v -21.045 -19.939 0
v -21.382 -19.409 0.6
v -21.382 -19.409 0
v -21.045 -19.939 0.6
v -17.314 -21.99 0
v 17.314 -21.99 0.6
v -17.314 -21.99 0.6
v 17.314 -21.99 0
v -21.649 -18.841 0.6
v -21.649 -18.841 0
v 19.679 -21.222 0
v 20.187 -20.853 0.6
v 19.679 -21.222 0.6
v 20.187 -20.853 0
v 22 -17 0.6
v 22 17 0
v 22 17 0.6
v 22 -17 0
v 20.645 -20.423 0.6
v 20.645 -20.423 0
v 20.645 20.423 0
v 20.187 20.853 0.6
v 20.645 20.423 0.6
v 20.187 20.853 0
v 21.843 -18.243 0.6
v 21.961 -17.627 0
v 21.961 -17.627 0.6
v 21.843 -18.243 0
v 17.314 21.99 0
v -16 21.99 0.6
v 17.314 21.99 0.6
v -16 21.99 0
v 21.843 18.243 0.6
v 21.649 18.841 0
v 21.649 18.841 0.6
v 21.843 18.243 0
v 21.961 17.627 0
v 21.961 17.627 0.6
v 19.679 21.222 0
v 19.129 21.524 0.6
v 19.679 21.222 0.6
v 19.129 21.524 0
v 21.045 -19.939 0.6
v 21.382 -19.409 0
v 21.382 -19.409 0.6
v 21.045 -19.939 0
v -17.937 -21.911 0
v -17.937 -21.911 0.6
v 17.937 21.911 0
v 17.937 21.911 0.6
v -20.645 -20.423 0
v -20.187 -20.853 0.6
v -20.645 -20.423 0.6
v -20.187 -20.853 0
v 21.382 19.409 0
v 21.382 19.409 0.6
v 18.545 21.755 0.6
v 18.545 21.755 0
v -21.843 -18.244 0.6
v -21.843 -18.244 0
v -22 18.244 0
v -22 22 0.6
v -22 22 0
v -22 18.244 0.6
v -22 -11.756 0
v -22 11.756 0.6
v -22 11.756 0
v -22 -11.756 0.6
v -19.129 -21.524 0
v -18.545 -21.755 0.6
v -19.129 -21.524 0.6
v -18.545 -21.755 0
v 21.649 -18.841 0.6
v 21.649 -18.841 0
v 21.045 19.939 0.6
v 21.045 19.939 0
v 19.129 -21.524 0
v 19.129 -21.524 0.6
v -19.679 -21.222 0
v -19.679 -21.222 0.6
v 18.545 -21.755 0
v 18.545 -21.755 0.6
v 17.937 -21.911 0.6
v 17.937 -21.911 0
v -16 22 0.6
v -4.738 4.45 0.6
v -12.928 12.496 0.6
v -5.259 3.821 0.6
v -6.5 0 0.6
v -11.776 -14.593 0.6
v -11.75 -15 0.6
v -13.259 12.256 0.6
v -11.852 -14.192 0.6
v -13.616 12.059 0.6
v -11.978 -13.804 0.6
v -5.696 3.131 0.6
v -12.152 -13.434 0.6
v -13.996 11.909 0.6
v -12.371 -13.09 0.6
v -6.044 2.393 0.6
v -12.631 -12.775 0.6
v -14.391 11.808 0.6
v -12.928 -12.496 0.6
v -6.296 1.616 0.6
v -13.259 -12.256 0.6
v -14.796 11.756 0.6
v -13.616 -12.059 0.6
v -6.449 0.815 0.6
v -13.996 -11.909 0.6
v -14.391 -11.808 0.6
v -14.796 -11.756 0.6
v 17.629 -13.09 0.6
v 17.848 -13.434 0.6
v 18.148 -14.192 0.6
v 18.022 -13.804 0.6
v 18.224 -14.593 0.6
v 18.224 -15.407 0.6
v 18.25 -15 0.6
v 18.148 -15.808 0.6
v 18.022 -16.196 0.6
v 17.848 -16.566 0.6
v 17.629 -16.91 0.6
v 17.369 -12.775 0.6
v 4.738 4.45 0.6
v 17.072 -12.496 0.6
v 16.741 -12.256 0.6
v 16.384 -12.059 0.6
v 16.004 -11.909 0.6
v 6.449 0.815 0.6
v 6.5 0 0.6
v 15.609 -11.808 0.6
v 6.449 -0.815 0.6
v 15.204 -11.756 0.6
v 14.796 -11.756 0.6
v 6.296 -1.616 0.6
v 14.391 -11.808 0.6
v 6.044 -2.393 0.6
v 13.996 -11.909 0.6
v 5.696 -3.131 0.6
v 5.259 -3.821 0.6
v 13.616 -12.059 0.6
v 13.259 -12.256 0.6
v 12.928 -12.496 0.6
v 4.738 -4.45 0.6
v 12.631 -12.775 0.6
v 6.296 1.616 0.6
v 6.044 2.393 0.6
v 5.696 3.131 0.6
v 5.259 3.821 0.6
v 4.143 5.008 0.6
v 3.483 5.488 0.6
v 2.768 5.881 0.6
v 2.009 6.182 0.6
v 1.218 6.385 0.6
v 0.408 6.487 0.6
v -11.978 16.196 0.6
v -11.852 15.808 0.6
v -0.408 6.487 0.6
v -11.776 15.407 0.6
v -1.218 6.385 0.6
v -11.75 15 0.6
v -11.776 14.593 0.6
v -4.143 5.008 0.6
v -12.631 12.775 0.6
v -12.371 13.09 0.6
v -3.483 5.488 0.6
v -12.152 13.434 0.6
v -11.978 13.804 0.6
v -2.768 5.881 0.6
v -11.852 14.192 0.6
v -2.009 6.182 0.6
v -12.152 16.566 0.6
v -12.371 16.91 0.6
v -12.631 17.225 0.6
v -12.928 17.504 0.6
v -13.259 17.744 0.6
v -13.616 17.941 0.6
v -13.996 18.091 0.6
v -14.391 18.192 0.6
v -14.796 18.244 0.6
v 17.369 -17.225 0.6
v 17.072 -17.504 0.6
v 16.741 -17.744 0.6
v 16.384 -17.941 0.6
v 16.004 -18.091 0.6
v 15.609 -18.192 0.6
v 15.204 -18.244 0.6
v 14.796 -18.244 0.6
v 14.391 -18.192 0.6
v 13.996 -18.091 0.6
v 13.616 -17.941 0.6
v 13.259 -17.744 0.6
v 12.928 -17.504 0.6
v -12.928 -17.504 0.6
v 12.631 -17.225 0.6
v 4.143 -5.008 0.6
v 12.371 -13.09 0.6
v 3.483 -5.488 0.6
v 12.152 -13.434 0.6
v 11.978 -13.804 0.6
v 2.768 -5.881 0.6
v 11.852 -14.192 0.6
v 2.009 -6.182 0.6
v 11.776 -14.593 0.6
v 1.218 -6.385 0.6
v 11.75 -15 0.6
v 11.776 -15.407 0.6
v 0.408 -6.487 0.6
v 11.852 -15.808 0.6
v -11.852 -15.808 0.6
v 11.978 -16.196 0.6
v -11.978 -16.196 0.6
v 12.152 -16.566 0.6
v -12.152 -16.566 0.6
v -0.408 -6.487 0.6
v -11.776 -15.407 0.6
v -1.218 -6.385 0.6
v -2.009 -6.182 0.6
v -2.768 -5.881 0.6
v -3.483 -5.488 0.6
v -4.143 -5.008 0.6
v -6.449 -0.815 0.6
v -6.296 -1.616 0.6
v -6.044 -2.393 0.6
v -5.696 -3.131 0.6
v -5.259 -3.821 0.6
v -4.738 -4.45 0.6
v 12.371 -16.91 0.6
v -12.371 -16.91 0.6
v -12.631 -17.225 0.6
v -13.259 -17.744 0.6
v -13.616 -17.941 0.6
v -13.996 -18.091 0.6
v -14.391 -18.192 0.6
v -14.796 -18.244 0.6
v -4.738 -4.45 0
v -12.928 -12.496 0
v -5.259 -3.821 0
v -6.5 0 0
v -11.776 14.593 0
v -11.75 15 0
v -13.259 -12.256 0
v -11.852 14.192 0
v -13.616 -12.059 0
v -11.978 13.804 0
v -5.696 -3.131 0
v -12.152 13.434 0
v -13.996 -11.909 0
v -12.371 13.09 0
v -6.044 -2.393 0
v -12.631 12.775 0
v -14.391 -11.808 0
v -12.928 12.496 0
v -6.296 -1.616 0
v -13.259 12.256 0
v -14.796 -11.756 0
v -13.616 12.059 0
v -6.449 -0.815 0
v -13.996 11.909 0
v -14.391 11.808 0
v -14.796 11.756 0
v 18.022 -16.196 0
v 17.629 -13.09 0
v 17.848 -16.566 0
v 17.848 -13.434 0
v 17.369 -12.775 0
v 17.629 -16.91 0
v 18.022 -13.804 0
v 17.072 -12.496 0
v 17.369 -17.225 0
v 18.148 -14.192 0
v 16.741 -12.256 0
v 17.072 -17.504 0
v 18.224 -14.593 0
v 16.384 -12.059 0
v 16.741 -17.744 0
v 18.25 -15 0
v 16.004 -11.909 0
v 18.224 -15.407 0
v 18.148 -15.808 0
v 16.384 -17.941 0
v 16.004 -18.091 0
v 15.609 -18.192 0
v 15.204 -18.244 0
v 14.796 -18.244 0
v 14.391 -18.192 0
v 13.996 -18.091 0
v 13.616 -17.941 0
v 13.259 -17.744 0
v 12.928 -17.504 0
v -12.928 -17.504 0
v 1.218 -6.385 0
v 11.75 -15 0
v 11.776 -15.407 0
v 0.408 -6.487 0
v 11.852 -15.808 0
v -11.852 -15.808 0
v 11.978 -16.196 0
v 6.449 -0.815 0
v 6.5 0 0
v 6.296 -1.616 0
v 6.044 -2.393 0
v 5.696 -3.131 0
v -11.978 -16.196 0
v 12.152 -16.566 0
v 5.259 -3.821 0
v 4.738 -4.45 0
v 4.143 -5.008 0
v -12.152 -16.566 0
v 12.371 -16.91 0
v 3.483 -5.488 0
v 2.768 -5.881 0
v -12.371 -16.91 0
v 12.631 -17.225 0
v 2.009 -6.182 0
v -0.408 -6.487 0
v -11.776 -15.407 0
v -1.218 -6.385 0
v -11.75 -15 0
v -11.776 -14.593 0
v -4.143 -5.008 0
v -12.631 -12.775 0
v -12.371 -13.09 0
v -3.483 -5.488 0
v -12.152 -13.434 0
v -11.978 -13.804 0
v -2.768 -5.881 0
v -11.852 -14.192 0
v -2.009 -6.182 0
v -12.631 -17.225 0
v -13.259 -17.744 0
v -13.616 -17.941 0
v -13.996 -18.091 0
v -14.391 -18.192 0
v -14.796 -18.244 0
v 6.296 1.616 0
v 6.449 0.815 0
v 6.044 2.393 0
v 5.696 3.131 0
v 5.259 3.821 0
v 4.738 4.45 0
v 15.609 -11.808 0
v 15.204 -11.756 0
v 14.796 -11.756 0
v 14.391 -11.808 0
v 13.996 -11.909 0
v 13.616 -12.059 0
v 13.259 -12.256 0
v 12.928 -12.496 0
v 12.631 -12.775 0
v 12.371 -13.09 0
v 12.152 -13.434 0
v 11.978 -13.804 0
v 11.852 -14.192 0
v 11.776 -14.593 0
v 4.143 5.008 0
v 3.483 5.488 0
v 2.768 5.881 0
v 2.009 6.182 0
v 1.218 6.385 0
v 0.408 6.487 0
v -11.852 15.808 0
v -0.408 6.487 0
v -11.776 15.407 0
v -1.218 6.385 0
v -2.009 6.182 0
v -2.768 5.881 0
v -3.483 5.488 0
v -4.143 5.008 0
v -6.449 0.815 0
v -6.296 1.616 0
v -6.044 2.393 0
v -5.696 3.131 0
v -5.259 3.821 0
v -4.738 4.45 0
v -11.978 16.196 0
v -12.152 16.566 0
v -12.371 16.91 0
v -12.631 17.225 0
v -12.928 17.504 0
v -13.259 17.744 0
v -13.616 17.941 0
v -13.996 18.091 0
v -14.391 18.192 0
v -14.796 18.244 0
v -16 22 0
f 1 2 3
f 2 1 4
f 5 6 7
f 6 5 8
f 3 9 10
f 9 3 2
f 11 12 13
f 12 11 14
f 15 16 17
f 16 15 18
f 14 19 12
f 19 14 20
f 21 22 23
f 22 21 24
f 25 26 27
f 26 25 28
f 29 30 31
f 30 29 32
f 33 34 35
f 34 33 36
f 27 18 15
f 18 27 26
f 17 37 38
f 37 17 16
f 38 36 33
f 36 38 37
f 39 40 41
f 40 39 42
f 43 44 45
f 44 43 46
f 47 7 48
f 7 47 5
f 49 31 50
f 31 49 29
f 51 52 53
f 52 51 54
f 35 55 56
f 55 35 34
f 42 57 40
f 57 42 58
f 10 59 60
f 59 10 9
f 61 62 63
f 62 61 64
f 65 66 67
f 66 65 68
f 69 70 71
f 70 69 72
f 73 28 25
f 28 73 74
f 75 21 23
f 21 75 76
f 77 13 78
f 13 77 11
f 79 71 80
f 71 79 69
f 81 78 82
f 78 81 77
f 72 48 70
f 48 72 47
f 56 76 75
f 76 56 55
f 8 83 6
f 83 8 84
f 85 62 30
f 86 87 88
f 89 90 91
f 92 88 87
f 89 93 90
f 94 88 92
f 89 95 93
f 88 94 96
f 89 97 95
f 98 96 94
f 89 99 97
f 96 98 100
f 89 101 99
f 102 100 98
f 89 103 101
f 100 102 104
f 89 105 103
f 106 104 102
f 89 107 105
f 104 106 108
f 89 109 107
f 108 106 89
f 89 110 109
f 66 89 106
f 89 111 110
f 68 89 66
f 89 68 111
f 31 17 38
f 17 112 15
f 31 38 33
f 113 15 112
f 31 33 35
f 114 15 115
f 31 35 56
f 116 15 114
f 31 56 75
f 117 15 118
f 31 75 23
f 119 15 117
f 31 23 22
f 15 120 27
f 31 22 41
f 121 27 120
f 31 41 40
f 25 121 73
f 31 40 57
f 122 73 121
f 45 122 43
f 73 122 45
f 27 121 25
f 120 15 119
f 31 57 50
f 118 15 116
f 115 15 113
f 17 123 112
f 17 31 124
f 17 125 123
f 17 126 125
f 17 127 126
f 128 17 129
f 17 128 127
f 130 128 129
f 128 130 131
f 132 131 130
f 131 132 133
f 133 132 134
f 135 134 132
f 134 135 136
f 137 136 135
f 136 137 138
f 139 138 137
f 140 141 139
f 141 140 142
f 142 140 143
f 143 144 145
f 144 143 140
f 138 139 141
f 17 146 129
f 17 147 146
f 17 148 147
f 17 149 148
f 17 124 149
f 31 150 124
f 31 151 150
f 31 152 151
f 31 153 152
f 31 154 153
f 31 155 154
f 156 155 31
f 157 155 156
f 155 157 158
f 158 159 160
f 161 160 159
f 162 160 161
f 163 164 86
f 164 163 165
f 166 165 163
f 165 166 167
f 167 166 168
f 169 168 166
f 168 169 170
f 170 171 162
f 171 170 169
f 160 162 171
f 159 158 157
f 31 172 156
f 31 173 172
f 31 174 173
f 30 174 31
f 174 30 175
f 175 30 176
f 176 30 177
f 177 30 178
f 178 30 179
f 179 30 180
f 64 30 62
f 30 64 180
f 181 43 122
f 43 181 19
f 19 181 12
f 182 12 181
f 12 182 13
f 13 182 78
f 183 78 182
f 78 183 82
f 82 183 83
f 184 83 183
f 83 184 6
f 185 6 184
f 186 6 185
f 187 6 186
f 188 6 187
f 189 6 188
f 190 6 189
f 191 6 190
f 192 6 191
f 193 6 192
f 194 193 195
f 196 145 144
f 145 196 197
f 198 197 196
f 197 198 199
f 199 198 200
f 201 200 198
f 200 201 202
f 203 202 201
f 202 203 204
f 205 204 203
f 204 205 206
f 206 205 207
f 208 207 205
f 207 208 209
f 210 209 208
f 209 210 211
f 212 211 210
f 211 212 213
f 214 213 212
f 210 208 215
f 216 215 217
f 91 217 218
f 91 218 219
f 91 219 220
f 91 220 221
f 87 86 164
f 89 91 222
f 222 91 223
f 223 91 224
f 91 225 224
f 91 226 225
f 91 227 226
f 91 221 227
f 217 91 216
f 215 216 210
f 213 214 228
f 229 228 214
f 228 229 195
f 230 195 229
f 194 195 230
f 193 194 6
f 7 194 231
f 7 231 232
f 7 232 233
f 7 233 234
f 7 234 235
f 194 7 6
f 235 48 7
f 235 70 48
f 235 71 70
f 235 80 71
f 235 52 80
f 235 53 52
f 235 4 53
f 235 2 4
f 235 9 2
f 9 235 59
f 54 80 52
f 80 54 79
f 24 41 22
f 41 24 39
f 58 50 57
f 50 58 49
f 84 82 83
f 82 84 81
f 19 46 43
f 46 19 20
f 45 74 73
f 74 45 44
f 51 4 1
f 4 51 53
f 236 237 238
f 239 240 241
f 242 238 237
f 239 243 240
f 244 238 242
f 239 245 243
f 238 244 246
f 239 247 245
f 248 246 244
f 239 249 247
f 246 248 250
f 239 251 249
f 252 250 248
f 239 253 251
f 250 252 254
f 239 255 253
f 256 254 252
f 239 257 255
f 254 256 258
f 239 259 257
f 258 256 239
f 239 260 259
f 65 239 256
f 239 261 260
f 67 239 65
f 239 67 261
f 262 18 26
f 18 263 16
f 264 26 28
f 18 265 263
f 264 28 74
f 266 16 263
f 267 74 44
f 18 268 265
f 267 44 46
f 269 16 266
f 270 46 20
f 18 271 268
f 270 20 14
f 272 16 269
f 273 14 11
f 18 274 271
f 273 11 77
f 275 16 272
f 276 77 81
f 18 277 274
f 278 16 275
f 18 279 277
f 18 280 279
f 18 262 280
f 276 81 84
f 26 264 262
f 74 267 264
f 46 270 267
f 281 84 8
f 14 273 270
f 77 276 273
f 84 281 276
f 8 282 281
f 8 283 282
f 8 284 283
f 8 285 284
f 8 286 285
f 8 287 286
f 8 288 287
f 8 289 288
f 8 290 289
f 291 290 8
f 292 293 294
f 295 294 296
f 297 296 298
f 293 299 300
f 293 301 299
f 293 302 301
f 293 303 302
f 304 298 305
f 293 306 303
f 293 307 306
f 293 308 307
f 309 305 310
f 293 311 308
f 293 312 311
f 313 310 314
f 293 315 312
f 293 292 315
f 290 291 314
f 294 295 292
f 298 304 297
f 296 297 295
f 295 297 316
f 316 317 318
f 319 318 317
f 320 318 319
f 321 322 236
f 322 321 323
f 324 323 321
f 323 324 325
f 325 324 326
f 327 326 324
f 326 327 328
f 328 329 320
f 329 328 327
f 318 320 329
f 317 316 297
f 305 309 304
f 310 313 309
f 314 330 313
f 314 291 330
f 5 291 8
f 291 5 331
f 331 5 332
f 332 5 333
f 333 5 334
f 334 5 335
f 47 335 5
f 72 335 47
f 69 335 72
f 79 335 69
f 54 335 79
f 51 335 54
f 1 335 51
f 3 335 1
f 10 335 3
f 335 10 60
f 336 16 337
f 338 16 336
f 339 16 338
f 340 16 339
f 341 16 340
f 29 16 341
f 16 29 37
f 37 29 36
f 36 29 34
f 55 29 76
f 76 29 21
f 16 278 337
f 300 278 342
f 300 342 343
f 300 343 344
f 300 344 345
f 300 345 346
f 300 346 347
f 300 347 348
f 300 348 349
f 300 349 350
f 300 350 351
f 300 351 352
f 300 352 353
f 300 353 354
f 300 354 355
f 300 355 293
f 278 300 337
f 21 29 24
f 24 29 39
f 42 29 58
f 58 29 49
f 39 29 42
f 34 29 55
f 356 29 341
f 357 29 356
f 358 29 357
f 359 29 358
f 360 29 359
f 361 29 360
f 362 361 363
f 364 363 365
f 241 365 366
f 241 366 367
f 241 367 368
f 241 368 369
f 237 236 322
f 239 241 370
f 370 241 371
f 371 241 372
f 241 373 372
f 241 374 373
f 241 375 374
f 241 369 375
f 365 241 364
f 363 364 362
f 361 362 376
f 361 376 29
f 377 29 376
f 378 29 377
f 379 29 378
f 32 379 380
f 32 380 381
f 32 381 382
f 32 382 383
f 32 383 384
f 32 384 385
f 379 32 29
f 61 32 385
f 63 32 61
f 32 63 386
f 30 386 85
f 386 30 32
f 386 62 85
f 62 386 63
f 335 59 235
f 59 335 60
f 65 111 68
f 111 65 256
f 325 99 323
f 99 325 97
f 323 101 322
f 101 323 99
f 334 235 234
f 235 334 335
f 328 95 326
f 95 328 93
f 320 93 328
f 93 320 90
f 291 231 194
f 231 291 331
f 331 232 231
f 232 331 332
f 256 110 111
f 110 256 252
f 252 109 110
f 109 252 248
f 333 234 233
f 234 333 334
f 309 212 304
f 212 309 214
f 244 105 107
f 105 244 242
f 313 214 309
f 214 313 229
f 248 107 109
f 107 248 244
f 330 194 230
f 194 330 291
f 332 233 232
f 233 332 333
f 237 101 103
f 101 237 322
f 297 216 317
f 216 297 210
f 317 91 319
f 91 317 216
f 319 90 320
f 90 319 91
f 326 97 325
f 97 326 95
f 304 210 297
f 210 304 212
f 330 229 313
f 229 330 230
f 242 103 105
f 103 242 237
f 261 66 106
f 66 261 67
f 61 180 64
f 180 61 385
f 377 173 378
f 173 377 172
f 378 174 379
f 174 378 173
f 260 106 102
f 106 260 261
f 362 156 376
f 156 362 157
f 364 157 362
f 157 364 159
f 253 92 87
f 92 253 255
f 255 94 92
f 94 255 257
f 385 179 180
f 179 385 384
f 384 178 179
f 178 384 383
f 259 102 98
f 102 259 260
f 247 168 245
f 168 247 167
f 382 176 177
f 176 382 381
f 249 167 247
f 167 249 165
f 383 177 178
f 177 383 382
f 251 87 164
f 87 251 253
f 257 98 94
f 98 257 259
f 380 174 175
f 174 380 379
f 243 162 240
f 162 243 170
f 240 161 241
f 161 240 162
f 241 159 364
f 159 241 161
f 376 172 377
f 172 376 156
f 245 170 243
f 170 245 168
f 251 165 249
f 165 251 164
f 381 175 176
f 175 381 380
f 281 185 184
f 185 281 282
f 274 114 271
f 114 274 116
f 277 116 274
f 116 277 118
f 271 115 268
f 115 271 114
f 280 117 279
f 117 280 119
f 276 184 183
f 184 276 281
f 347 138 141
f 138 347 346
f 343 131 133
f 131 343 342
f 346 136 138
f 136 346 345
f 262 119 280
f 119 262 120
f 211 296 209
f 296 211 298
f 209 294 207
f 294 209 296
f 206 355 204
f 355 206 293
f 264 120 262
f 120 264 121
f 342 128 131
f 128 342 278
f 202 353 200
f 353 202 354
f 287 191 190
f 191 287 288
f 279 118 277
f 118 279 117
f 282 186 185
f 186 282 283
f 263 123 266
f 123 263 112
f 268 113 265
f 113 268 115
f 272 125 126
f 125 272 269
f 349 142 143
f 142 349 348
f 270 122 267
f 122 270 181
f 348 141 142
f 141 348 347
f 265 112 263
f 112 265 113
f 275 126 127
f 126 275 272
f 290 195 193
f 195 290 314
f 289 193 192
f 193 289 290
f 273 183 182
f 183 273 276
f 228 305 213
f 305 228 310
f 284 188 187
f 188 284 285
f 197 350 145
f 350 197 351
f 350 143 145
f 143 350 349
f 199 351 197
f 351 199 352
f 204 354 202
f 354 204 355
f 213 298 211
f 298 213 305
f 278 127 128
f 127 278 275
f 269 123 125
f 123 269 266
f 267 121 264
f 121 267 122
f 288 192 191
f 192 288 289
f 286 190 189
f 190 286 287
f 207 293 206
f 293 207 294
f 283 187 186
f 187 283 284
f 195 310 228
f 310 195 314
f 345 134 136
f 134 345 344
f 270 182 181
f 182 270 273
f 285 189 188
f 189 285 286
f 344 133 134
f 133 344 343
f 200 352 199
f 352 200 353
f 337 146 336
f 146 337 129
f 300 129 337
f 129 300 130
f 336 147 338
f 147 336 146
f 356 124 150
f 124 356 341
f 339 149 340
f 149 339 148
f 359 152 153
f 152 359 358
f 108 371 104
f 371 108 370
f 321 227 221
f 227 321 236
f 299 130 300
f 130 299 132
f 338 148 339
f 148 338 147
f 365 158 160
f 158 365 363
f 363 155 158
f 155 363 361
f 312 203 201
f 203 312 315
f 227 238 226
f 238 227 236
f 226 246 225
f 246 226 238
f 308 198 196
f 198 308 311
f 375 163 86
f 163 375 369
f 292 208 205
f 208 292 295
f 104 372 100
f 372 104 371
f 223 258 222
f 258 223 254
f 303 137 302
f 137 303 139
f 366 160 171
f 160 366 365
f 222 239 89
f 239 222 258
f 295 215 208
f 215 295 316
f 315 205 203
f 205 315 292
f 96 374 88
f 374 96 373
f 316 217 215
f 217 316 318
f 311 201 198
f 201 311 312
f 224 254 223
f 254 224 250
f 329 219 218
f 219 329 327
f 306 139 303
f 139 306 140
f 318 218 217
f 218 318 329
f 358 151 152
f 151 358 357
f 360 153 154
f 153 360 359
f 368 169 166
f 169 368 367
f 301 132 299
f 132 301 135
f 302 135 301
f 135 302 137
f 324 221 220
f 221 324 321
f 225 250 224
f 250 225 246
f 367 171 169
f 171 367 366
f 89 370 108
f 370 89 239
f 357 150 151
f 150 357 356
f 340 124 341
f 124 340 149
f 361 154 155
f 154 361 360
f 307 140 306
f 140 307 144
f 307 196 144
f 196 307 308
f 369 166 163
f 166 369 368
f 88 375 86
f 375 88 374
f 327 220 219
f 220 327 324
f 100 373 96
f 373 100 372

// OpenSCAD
$fn = 50;


difference() {
	union() {
		translate(v = [0, 0, 0]) {
			rotate(a = [0, 0, 0]) {
				hull() {
					translate(v = [-17.0000000000, 17.0000000000, 0]) {
						rotate(a = [0, 0, 0]) {
							translate(v = [0, 0, 0]) {
								rotate(a = [0, 0, 0]) {
									cylinder(h = 0.6000000000, r = 5);
								}
							}
						}
					}
					translate(v = [17.0000000000, 17.0000000000, 0]) {
						rotate(a = [0, 0, 0]) {
							translate(v = [0, 0, 0]) {
								rotate(a = [0, 0, 0]) {
									cylinder(h = 0.6000000000, r = 5);
								}
							}
						}
					}
					translate(v = [-17.0000000000, -17.0000000000, 0]) {
						rotate(a = [0, 0, 0]) {
							translate(v = [0, 0, 0]) {
								rotate(a = [0, 0, 0]) {
									cylinder(h = 0.6000000000, r = 5);
								}
							}
						}
					}
					translate(v = [17.0000000000, -17.0000000000, 0]) {
						rotate(a = [0, 0, 0]) {
							translate(v = [0, 0, 0]) {
								rotate(a = [0, 0, 0]) {
									cylinder(h = 0.6000000000, r = 5);
								}
							}
						}
					}
				}
			}
		}
		translate(v = [-22.0000000000, 16.0000000000, 0]) {
			rotate(a = [0, 0, 0]) {
				cube(size = [6, 6, 0.6000000000]);
			}
		}
	}
	union() {
		translate(v = [-22.5000000000, -15.0000000000, -125]) {
			rotate(a = [0, 0, 0]) {
				hull() {
					translate(v = [7.5000000000, 0, 0]) {
						rotate(a = [0, 0, 0]) {
							translate(v = [0, 0, 0]) {
								rotate(a = [0, 0, 0]) {
									cylinder(h = 250, r = 3.2500000000);
								}
							}
						}
					}
					translate(v = [-7.5000000000, 0, 0]) {
						rotate(a = [0, 0, 0]) {
							translate(v = [0, 0, 0]) {
								rotate(a = [0, 0, 0]) {
									cylinder(h = 250, r = 3.2500000000);
								}
							}
						}
					}
				}
			}
		}
		translate(v = [-22.5000000000, 15.0000000000, -125]) {
			rotate(a = [0, 0, 0]) {
				hull() {
					translate(v = [7.5000000000, 0, 0]) {
						rotate(a = [0, 0, 0]) {
							translate(v = [0, 0, 0]) {
								rotate(a = [0, 0, 0]) {
									cylinder(h = 250, r = 3.2500000000);
								}
							}
						}
					}
					translate(v = [-7.5000000000, 0, 0]) {
						rotate(a = [0, 0, 0]) {
							translate(v = [0, 0, 0]) {
								rotate(a = [0, 0, 0]) {
									cylinder(h = 250, r = 3.2500000000);
								}
							}
						}
					}
				}
			}
		}
		translate(v = [15.0000000000, -15.0000000000, -125.0000000000]) {
			rotate(a = [0, 0, 0]) {
				cylinder(h = 250, r = 3.2500000000);
			}
		}
		translate(v = [0, 0, 0.0000000000]) {
			rotate(a = [0, 0, 0]) {
				cylinder(h = 0.6000000000, r = 6.5000000000);
			}
		}
	}
}
